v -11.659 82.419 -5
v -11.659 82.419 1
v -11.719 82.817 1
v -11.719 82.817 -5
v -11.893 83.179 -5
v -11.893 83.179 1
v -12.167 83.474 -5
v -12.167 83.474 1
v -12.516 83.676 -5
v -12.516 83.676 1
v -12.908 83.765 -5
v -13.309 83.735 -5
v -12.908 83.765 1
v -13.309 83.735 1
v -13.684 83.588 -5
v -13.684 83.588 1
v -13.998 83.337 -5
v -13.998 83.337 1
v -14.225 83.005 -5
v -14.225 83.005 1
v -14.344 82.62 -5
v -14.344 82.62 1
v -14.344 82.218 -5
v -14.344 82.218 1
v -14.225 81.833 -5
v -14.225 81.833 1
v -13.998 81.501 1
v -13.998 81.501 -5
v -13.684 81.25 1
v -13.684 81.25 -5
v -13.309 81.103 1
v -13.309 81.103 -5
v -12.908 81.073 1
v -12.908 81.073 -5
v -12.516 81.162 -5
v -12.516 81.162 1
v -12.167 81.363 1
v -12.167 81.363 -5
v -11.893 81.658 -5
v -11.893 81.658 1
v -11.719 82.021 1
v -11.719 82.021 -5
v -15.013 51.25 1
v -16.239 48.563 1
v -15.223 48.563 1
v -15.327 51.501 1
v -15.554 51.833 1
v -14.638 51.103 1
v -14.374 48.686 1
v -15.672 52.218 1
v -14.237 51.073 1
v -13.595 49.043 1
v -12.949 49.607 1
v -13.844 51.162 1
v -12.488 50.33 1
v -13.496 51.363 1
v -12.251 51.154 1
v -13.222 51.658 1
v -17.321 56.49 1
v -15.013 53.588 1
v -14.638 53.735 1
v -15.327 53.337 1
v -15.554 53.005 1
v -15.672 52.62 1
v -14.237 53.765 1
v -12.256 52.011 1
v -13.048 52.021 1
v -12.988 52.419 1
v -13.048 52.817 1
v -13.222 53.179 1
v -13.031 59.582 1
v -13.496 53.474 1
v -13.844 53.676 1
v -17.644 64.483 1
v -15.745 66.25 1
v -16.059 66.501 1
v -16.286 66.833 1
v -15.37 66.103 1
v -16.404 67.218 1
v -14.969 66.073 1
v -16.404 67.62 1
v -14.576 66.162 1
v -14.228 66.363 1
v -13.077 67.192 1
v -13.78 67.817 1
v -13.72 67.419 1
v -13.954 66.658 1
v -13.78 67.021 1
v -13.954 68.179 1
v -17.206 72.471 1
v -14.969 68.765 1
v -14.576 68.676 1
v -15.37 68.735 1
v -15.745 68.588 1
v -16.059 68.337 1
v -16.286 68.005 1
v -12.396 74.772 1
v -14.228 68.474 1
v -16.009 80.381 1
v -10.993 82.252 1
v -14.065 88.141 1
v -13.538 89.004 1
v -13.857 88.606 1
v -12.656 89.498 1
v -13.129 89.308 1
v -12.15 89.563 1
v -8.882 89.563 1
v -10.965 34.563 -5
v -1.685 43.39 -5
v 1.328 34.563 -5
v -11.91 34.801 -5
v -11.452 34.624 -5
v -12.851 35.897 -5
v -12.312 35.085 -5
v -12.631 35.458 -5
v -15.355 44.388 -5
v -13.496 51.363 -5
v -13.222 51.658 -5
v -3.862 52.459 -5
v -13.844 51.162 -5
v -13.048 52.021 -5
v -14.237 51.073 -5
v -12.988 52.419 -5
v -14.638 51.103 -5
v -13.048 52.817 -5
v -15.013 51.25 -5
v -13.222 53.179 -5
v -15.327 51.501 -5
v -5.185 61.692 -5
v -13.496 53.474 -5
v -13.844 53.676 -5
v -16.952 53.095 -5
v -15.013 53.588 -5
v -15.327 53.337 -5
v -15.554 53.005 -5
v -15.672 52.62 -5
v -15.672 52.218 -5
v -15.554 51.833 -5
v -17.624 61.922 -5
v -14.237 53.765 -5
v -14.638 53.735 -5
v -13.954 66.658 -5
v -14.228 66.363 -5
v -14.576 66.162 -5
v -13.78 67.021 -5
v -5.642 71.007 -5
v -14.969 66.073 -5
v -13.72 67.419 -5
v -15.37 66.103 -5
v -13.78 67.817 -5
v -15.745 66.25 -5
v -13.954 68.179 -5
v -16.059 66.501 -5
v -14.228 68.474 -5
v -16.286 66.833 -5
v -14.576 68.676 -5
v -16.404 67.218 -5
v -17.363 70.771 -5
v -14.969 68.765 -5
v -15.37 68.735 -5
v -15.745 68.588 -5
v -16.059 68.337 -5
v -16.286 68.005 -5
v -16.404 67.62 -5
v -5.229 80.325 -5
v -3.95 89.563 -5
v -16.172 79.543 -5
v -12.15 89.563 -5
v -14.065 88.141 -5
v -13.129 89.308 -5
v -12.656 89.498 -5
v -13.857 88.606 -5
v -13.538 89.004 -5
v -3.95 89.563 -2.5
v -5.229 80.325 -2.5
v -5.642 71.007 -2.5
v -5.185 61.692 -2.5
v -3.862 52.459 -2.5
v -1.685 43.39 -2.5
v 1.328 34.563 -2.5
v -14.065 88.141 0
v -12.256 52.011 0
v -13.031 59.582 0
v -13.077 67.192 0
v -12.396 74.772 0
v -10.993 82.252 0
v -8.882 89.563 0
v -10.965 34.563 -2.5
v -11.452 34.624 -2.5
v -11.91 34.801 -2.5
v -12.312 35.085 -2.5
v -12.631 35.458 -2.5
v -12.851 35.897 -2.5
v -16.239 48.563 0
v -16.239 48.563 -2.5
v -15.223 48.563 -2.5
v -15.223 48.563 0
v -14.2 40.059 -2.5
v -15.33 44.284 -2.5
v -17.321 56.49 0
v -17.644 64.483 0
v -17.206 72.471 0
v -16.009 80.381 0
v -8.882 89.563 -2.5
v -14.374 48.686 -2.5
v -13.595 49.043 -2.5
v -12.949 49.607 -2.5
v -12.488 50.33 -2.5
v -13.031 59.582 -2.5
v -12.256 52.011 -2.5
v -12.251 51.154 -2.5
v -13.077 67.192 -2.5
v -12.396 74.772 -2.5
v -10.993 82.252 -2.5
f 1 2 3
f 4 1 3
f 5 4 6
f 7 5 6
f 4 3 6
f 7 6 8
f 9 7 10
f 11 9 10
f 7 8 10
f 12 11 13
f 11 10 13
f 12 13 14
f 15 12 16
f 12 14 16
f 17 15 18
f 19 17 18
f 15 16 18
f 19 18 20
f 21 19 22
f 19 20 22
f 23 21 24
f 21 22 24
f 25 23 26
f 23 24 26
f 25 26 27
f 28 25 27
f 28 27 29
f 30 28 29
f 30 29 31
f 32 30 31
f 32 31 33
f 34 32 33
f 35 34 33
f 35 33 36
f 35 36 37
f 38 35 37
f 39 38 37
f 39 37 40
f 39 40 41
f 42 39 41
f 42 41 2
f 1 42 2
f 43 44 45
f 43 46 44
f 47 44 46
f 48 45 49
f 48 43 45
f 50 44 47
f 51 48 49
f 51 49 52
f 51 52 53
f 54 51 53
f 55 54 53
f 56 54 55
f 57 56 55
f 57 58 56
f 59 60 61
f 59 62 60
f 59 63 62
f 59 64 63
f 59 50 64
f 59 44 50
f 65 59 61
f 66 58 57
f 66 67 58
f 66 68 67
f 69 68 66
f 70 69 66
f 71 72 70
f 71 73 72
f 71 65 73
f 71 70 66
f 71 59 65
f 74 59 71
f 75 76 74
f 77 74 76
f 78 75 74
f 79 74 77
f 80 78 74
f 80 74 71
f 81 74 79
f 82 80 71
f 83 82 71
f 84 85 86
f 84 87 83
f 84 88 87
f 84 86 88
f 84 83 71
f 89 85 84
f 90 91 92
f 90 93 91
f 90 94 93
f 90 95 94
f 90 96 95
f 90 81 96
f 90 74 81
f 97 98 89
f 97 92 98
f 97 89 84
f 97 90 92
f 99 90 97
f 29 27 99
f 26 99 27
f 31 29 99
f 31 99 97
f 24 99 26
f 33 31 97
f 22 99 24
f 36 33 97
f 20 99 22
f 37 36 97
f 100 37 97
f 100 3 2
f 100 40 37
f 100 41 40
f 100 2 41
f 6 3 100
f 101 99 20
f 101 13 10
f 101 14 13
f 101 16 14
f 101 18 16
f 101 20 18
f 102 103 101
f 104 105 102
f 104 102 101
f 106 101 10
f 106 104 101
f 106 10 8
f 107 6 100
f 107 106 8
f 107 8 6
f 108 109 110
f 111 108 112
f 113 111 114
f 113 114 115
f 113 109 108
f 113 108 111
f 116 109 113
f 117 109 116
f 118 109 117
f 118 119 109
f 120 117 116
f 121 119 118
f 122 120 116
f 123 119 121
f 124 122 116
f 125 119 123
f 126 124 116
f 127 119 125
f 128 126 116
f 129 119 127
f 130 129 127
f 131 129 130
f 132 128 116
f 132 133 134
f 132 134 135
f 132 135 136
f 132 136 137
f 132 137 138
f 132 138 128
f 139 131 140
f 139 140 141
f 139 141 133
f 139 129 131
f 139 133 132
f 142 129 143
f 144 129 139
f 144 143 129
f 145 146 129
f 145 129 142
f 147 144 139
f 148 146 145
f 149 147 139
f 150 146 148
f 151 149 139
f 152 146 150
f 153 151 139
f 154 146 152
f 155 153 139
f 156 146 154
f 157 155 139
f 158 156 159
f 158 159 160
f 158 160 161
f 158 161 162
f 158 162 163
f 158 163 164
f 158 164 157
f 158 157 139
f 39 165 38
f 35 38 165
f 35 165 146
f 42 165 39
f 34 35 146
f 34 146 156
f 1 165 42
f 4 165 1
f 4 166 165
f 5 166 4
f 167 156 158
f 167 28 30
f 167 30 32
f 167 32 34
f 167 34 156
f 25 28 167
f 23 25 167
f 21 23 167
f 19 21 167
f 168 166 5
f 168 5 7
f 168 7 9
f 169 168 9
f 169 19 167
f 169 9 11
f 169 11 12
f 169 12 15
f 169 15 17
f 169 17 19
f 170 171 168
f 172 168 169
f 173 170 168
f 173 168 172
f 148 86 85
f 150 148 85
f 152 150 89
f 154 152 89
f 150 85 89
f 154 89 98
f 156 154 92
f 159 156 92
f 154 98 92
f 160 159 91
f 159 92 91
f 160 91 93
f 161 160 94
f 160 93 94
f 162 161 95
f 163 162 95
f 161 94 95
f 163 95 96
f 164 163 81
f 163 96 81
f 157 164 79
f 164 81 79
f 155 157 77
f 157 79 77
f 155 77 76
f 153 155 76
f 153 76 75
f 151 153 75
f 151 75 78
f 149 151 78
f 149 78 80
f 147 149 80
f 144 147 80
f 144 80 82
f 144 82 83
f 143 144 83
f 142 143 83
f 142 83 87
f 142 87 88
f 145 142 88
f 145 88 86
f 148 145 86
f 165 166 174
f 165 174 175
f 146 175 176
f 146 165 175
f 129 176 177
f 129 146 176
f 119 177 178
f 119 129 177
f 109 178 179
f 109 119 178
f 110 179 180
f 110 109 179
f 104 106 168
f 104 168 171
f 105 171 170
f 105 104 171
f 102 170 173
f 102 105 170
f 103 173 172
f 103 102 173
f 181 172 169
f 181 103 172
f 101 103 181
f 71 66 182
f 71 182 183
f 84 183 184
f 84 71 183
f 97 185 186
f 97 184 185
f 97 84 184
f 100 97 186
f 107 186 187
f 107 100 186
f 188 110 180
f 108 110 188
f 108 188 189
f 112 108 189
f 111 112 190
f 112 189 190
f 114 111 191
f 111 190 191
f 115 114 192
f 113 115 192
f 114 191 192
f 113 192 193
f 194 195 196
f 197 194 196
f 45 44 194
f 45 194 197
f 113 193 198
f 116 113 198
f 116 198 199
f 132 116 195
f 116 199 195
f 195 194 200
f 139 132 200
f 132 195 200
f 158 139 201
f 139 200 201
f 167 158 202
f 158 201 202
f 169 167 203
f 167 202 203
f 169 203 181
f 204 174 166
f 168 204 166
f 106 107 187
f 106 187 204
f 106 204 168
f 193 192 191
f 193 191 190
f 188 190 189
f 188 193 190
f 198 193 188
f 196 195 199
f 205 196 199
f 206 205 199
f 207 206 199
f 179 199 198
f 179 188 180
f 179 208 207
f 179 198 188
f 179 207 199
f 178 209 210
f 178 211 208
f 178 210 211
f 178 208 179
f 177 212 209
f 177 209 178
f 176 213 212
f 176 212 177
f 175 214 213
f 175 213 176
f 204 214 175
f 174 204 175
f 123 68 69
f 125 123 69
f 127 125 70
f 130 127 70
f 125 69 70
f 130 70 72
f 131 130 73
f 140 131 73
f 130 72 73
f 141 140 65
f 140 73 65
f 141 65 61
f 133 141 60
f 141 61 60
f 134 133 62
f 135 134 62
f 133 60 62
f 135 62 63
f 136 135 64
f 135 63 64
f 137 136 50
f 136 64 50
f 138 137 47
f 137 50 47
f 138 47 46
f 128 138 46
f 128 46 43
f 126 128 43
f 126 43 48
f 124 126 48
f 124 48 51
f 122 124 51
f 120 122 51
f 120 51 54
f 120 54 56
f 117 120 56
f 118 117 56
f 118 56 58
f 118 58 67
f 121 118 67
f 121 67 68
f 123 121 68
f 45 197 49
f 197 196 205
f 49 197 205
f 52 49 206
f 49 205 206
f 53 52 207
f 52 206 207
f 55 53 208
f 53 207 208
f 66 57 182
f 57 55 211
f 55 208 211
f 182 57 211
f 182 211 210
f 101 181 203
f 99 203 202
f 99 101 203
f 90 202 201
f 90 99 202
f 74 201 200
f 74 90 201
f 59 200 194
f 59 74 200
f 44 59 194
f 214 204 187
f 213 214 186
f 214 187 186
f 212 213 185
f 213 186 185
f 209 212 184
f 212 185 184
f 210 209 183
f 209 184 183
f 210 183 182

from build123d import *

# Parameters (mm, degrees)
SKETCH_1_R           = 3.5
EXTRUDE_1_DEPTH      = 3
SKETCH_2_R           = 1.5
CUT_EXTRUDE_1_DEPTH  = 10
EXTRUDE_2_DEPTH      = 4
EXTRUDE_5_DEPTH      = 7
FILLET_1_R           = 2
HOLE_WIZARD_M2_5_1_D = 2.05
SKETCH_12_R          = 1.025
EXTRUDE_6_DEPTH      = 5
EXTRUDE_7_DEPTH      = 2.5
CUT_EXTRUDE_START    = 2.5
SKETCH_14_W          = 65.294749478
SKETCH_14_H          = 102.548808998
CUT_EXTRUDE_2_DEPTH  = 93.634928881
CUT_EXTRUDE_3_DEPTH  = 2.5
SKETCH_16_R          = 1.35
CUT_EXTRUDE_4_DEPTH  = 10
EXTRUDE_START        = 1
SKETCH_17_R          = 1.35
EXTRUDE_8_DEPTH      = 1
FILLET_2_R           = 3


with BuildPart() as part:
    # 草图1 → 凸台-拉伸1 (new body)
    with BuildSketch(Plane.XY):
        with BuildLine():
            Line((0, 0), (17, 0))
            Line((17, 0), (17, 21))
            ThreePointArc((17, 21), (14.559389791, 26.961023013), (8.639106973, 29.498861644))
            ThreePointArc((8.639106973, 29.498861644), (4.214678609, 30.921411086), (1.327625741, 34.563407653))
            ThreePointArc((1.327625741, 34.563407653), (-5.234705957, 62.223549547), (-3.748501306, 90.612611571))
            ThreePointArc((-3.748501306, 90.612611571), (-5.162788524, 92.923505905), (-7.58241645, 91.704554856))
            ThreePointArc((-7.58241645, 91.704554856), (-12.196269834, 55.45091149), (0, 21))
            Line((0, 21), (0, 0))
        make_face()
        with Locations((8.5, 21)):
            Circle(SKETCH_1_R, mode=Mode.SUBTRACT)
    extrude(amount=EXTRUDE_1_DEPTH)

    # 草图2 → 切除-拉伸1 (cut)
    with BuildSketch(Plane(origin=(0, 0, 0), x_dir=(-1, 0, 0), z_dir=(0, 0, -1))):
        with Locations((-14, 4)):
            Circle(SKETCH_2_R)
        with Locations(Location((-3, 4, 0), (0, 0, 180))):
            Circle(SKETCH_2_R)
    extrude(amount=-CUT_EXTRUDE_1_DEPTH, mode=Mode.SUBTRACT)

    # 草图3 → 凸台-拉伸2 (add)
    with BuildSketch(Plane.XY.offset(3)):
        with BuildLine():
            ThreePointArc((-7.58241645, 91.704554856), (-12.6426678, 63.080202535), (-7.007767698, 34.563407653))
            Line((-7.007767698, 34.563407653), (1.327625741, 34.563407653))
            ThreePointArc((1.327625741, 34.563407653), (-5.234705957, 62.223549547), (-3.748501306, 90.612611571))
            ThreePointArc((-3.748501306, 90.612611571), (-5.162788524, 92.923505905), (-7.58241645, 91.704554856))
        make_face()
    extrude(amount=EXTRUDE_2_DEPTH)

    # 草图8 → 凸台-拉伸5 (add)
    with BuildSketch(Plane(origin=(0, 0, 0), x_dir=(-1, 0, 0), z_dir=(0, 0, -1))):
        with BuildLine():
            Line((8.353336216, 89.563407653), (13.622203114, 89.563407653))
            ThreePointArc((13.622203114, 89.563407653), (17.624786926, 61.957713987), (12.366747323, 34.563407653))
            Line((12.366747323, 34.563407653), (7.007767698, 34.563407653))
            ThreePointArc((7.007767698, 34.563407653), (12.623031035, 61.942490485), (8.353336216, 89.563407653))
        make_face()
    extrude(amount=-EXTRUDE_5_DEPTH)

    # 圆角1
    fillet_1_edges = [part.edges().sort_by_distance(p)[0] for p in [
        (-12.366747323, 34.563407653, 3.5),
        (-13.622203114, 89.563407653, 3.5),
        (-8.353336216, 89.563407653, 3.5),
        (-7.007767698, 34.563407653, 1.5),
    ]]
    fillet(fillet_1_edges, radius=FILLET_1_R)

    # M2.5 螺纹孔1 (through all)
    with Locations(Plane(origin=(0, 0, 0), x_dir=(-1, 0, 0), z_dir=(0, 0, -1))):
        with Locations((14.33753876, 52.418963936), (-20.3596947, 65.689324708), (13.008857265, 82.418963936), (15.069556912, 67.418963936)):
            Hole(HOLE_WIZARD_M2_5_1_D / 2)

    # 草图12 → 凸台-拉伸6 (add)
    with BuildSketch(Plane(origin=(0, 0, 0), x_dir=(-1, 0, 0), z_dir=(0, 0, -1))):
        with BuildLine():
            Line((7.545930127, 34.563407653), (8.350121818, 34.563407653))
            Line((8.350121818, 34.563407653), (10.964814809, 34.563407653))
            ThreePointArc((10.964814809, 34.563407653), (12.119748759, 34.930579564), (12.850623405, 35.897280083))
            ThreePointArc((12.850623405, 35.897280083), (17.623972952, 61.922380585), (14.065160369, 88.141182522))
            ThreePointArc((14.065160369, 88.141182522), (13.343005034, 89.168952691), (12.150434226, 89.563407653))
            Line((12.150434226, 89.563407653), (9.767172344, 89.563407653))
            Line((9.767172344, 89.563407653), (8.88187432, 89.563407653))
            ThreePointArc((8.88187432, 89.563407653), (13.123220294, 61.944160836), (7.545930127, 34.563407653))
        make_face()
        with Locations((14.33753876, 52.418963936)):
            Circle(SKETCH_12_R, mode=Mode.SUBTRACT)
        with Locations((15.069556912, 67.418963936)):
            Circle(SKETCH_12_R, mode=Mode.SUBTRACT)
        with Locations((13.008857265, 82.418963936)):
            Circle(SKETCH_12_R, mode=Mode.SUBTRACT)
    extrude(amount=EXTRUDE_6_DEPTH)

    # 草图13 → 凸台-拉伸7 (add)
    with BuildSketch(Plane(origin=(0, 0, -5), x_dir=(-1, 0, 0), z_dir=(0, 0, -1))):
        with BuildLine():
            Line((-1.327625741, 34.563407653), (7.545930127, 34.563407653))
            ThreePointArc((7.545930127, 34.563407653), (13.123220294, 61.944160836), (8.88187432, 89.563407653))
            Line((8.88187432, 89.563407653), (3.949832031, 89.563407653))
            ThreePointArc((3.949832031, 89.563407653), (5.185104579, 61.691682581), (-1.327625741, 34.563407653))
        make_face()
    extrude(amount=-EXTRUDE_7_DEPTH)

    # 草图14 → 切除-拉伸2 (cut, through all)
    with BuildSketch(Plane.XY.offset(-2.5).offset(CUT_EXTRUDE_START)):
        with Locations((4.683934874, 45.498546787)):
            Rectangle(SKETCH_14_W, SKETCH_14_H)
    extrude(amount=CUT_EXTRUDE_2_DEPTH, mode=Mode.SUBTRACT)

    # 草图15 → 切除-拉伸3 (cut)
    with BuildSketch(Plane.XY.offset(-2.5).offset(CUT_EXTRUDE_START)):
        with BuildLine():
            Line((-11.658303974, 48.563407653), (-16.239435818, 48.563407653))
            ThreePointArc((-16.239435818, 48.563407653), (-14.792540388, 42.164122556), (-12.850623405, 35.897280083))
            ThreePointArc((-12.850623405, 35.897280083), (-12.119748759, 34.930579564), (-10.964814809, 34.563407653))
            Line((-10.964814809, 34.563407653), (-7.545930127, 34.563407653))
            ThreePointArc((-7.545930127, 34.563407653), (-9.923992526, 41.468859633), (-11.658303974, 48.563407653))
        make_face()
    extrude(amount=-CUT_EXTRUDE_3_DEPTH, mode=Mode.SUBTRACT)

    # 草图16 → 切除-拉伸4 (cut)
    with BuildSketch(Plane.XY):
        with Locations((-13.008857265, 82.418963936)):
            Circle(SKETCH_16_R)
        with Locations((-15.069556912, 67.418963936)):
            Circle(SKETCH_16_R)
        with Locations((-14.33753876, 52.418963936)):
            Circle(SKETCH_16_R)
    extrude(amount=-CUT_EXTRUDE_4_DEPTH, mode=Mode.SUBTRACT)

    # 草图17 → 凸台-拉伸8 (add)
    with BuildSketch(Plane.XY.offset(EXTRUDE_START)):
        with BuildLine():
            Line((-16.239435818, 48.563407653), (-11.658303974, 48.563407653))
            ThreePointArc((-11.658303974, 48.563407653), (-12.965005338, 69.245901439), (-8.88187432, 89.563407653))
            Line((-8.88187432, 89.563407653), (-12.150434226, 89.563407653))
            ThreePointArc((-12.150434226, 89.563407653), (-13.343005034, 89.168952691), (-14.065160369, 88.141182522))
            ThreePointArc((-14.065160369, 88.141182522), (-17.520190498, 68.482379468), (-16.239435818, 48.563407653))
        make_face()
        with Locations((-14.33753876, 52.418963936)):
            Circle(SKETCH_17_R, mode=Mode.SUBTRACT)
        with Locations((-15.069556912, 67.418963936)):
            Circle(SKETCH_17_R, mode=Mode.SUBTRACT)
        with Locations((-13.008857265, 82.418963936)):
            Circle(SKETCH_17_R, mode=Mode.SUBTRACT)
    extrude(amount=-EXTRUDE_8_DEPTH)

    # 圆角2
    fillet_2_edges = [part.edges().sort_by_distance(p)[0] for p in [
        (-11.658303974, 48.563407653, -0.75),
    ]]
    fillet(fillet_2_edges, radius=FILLET_2_R)


solid = part.part
